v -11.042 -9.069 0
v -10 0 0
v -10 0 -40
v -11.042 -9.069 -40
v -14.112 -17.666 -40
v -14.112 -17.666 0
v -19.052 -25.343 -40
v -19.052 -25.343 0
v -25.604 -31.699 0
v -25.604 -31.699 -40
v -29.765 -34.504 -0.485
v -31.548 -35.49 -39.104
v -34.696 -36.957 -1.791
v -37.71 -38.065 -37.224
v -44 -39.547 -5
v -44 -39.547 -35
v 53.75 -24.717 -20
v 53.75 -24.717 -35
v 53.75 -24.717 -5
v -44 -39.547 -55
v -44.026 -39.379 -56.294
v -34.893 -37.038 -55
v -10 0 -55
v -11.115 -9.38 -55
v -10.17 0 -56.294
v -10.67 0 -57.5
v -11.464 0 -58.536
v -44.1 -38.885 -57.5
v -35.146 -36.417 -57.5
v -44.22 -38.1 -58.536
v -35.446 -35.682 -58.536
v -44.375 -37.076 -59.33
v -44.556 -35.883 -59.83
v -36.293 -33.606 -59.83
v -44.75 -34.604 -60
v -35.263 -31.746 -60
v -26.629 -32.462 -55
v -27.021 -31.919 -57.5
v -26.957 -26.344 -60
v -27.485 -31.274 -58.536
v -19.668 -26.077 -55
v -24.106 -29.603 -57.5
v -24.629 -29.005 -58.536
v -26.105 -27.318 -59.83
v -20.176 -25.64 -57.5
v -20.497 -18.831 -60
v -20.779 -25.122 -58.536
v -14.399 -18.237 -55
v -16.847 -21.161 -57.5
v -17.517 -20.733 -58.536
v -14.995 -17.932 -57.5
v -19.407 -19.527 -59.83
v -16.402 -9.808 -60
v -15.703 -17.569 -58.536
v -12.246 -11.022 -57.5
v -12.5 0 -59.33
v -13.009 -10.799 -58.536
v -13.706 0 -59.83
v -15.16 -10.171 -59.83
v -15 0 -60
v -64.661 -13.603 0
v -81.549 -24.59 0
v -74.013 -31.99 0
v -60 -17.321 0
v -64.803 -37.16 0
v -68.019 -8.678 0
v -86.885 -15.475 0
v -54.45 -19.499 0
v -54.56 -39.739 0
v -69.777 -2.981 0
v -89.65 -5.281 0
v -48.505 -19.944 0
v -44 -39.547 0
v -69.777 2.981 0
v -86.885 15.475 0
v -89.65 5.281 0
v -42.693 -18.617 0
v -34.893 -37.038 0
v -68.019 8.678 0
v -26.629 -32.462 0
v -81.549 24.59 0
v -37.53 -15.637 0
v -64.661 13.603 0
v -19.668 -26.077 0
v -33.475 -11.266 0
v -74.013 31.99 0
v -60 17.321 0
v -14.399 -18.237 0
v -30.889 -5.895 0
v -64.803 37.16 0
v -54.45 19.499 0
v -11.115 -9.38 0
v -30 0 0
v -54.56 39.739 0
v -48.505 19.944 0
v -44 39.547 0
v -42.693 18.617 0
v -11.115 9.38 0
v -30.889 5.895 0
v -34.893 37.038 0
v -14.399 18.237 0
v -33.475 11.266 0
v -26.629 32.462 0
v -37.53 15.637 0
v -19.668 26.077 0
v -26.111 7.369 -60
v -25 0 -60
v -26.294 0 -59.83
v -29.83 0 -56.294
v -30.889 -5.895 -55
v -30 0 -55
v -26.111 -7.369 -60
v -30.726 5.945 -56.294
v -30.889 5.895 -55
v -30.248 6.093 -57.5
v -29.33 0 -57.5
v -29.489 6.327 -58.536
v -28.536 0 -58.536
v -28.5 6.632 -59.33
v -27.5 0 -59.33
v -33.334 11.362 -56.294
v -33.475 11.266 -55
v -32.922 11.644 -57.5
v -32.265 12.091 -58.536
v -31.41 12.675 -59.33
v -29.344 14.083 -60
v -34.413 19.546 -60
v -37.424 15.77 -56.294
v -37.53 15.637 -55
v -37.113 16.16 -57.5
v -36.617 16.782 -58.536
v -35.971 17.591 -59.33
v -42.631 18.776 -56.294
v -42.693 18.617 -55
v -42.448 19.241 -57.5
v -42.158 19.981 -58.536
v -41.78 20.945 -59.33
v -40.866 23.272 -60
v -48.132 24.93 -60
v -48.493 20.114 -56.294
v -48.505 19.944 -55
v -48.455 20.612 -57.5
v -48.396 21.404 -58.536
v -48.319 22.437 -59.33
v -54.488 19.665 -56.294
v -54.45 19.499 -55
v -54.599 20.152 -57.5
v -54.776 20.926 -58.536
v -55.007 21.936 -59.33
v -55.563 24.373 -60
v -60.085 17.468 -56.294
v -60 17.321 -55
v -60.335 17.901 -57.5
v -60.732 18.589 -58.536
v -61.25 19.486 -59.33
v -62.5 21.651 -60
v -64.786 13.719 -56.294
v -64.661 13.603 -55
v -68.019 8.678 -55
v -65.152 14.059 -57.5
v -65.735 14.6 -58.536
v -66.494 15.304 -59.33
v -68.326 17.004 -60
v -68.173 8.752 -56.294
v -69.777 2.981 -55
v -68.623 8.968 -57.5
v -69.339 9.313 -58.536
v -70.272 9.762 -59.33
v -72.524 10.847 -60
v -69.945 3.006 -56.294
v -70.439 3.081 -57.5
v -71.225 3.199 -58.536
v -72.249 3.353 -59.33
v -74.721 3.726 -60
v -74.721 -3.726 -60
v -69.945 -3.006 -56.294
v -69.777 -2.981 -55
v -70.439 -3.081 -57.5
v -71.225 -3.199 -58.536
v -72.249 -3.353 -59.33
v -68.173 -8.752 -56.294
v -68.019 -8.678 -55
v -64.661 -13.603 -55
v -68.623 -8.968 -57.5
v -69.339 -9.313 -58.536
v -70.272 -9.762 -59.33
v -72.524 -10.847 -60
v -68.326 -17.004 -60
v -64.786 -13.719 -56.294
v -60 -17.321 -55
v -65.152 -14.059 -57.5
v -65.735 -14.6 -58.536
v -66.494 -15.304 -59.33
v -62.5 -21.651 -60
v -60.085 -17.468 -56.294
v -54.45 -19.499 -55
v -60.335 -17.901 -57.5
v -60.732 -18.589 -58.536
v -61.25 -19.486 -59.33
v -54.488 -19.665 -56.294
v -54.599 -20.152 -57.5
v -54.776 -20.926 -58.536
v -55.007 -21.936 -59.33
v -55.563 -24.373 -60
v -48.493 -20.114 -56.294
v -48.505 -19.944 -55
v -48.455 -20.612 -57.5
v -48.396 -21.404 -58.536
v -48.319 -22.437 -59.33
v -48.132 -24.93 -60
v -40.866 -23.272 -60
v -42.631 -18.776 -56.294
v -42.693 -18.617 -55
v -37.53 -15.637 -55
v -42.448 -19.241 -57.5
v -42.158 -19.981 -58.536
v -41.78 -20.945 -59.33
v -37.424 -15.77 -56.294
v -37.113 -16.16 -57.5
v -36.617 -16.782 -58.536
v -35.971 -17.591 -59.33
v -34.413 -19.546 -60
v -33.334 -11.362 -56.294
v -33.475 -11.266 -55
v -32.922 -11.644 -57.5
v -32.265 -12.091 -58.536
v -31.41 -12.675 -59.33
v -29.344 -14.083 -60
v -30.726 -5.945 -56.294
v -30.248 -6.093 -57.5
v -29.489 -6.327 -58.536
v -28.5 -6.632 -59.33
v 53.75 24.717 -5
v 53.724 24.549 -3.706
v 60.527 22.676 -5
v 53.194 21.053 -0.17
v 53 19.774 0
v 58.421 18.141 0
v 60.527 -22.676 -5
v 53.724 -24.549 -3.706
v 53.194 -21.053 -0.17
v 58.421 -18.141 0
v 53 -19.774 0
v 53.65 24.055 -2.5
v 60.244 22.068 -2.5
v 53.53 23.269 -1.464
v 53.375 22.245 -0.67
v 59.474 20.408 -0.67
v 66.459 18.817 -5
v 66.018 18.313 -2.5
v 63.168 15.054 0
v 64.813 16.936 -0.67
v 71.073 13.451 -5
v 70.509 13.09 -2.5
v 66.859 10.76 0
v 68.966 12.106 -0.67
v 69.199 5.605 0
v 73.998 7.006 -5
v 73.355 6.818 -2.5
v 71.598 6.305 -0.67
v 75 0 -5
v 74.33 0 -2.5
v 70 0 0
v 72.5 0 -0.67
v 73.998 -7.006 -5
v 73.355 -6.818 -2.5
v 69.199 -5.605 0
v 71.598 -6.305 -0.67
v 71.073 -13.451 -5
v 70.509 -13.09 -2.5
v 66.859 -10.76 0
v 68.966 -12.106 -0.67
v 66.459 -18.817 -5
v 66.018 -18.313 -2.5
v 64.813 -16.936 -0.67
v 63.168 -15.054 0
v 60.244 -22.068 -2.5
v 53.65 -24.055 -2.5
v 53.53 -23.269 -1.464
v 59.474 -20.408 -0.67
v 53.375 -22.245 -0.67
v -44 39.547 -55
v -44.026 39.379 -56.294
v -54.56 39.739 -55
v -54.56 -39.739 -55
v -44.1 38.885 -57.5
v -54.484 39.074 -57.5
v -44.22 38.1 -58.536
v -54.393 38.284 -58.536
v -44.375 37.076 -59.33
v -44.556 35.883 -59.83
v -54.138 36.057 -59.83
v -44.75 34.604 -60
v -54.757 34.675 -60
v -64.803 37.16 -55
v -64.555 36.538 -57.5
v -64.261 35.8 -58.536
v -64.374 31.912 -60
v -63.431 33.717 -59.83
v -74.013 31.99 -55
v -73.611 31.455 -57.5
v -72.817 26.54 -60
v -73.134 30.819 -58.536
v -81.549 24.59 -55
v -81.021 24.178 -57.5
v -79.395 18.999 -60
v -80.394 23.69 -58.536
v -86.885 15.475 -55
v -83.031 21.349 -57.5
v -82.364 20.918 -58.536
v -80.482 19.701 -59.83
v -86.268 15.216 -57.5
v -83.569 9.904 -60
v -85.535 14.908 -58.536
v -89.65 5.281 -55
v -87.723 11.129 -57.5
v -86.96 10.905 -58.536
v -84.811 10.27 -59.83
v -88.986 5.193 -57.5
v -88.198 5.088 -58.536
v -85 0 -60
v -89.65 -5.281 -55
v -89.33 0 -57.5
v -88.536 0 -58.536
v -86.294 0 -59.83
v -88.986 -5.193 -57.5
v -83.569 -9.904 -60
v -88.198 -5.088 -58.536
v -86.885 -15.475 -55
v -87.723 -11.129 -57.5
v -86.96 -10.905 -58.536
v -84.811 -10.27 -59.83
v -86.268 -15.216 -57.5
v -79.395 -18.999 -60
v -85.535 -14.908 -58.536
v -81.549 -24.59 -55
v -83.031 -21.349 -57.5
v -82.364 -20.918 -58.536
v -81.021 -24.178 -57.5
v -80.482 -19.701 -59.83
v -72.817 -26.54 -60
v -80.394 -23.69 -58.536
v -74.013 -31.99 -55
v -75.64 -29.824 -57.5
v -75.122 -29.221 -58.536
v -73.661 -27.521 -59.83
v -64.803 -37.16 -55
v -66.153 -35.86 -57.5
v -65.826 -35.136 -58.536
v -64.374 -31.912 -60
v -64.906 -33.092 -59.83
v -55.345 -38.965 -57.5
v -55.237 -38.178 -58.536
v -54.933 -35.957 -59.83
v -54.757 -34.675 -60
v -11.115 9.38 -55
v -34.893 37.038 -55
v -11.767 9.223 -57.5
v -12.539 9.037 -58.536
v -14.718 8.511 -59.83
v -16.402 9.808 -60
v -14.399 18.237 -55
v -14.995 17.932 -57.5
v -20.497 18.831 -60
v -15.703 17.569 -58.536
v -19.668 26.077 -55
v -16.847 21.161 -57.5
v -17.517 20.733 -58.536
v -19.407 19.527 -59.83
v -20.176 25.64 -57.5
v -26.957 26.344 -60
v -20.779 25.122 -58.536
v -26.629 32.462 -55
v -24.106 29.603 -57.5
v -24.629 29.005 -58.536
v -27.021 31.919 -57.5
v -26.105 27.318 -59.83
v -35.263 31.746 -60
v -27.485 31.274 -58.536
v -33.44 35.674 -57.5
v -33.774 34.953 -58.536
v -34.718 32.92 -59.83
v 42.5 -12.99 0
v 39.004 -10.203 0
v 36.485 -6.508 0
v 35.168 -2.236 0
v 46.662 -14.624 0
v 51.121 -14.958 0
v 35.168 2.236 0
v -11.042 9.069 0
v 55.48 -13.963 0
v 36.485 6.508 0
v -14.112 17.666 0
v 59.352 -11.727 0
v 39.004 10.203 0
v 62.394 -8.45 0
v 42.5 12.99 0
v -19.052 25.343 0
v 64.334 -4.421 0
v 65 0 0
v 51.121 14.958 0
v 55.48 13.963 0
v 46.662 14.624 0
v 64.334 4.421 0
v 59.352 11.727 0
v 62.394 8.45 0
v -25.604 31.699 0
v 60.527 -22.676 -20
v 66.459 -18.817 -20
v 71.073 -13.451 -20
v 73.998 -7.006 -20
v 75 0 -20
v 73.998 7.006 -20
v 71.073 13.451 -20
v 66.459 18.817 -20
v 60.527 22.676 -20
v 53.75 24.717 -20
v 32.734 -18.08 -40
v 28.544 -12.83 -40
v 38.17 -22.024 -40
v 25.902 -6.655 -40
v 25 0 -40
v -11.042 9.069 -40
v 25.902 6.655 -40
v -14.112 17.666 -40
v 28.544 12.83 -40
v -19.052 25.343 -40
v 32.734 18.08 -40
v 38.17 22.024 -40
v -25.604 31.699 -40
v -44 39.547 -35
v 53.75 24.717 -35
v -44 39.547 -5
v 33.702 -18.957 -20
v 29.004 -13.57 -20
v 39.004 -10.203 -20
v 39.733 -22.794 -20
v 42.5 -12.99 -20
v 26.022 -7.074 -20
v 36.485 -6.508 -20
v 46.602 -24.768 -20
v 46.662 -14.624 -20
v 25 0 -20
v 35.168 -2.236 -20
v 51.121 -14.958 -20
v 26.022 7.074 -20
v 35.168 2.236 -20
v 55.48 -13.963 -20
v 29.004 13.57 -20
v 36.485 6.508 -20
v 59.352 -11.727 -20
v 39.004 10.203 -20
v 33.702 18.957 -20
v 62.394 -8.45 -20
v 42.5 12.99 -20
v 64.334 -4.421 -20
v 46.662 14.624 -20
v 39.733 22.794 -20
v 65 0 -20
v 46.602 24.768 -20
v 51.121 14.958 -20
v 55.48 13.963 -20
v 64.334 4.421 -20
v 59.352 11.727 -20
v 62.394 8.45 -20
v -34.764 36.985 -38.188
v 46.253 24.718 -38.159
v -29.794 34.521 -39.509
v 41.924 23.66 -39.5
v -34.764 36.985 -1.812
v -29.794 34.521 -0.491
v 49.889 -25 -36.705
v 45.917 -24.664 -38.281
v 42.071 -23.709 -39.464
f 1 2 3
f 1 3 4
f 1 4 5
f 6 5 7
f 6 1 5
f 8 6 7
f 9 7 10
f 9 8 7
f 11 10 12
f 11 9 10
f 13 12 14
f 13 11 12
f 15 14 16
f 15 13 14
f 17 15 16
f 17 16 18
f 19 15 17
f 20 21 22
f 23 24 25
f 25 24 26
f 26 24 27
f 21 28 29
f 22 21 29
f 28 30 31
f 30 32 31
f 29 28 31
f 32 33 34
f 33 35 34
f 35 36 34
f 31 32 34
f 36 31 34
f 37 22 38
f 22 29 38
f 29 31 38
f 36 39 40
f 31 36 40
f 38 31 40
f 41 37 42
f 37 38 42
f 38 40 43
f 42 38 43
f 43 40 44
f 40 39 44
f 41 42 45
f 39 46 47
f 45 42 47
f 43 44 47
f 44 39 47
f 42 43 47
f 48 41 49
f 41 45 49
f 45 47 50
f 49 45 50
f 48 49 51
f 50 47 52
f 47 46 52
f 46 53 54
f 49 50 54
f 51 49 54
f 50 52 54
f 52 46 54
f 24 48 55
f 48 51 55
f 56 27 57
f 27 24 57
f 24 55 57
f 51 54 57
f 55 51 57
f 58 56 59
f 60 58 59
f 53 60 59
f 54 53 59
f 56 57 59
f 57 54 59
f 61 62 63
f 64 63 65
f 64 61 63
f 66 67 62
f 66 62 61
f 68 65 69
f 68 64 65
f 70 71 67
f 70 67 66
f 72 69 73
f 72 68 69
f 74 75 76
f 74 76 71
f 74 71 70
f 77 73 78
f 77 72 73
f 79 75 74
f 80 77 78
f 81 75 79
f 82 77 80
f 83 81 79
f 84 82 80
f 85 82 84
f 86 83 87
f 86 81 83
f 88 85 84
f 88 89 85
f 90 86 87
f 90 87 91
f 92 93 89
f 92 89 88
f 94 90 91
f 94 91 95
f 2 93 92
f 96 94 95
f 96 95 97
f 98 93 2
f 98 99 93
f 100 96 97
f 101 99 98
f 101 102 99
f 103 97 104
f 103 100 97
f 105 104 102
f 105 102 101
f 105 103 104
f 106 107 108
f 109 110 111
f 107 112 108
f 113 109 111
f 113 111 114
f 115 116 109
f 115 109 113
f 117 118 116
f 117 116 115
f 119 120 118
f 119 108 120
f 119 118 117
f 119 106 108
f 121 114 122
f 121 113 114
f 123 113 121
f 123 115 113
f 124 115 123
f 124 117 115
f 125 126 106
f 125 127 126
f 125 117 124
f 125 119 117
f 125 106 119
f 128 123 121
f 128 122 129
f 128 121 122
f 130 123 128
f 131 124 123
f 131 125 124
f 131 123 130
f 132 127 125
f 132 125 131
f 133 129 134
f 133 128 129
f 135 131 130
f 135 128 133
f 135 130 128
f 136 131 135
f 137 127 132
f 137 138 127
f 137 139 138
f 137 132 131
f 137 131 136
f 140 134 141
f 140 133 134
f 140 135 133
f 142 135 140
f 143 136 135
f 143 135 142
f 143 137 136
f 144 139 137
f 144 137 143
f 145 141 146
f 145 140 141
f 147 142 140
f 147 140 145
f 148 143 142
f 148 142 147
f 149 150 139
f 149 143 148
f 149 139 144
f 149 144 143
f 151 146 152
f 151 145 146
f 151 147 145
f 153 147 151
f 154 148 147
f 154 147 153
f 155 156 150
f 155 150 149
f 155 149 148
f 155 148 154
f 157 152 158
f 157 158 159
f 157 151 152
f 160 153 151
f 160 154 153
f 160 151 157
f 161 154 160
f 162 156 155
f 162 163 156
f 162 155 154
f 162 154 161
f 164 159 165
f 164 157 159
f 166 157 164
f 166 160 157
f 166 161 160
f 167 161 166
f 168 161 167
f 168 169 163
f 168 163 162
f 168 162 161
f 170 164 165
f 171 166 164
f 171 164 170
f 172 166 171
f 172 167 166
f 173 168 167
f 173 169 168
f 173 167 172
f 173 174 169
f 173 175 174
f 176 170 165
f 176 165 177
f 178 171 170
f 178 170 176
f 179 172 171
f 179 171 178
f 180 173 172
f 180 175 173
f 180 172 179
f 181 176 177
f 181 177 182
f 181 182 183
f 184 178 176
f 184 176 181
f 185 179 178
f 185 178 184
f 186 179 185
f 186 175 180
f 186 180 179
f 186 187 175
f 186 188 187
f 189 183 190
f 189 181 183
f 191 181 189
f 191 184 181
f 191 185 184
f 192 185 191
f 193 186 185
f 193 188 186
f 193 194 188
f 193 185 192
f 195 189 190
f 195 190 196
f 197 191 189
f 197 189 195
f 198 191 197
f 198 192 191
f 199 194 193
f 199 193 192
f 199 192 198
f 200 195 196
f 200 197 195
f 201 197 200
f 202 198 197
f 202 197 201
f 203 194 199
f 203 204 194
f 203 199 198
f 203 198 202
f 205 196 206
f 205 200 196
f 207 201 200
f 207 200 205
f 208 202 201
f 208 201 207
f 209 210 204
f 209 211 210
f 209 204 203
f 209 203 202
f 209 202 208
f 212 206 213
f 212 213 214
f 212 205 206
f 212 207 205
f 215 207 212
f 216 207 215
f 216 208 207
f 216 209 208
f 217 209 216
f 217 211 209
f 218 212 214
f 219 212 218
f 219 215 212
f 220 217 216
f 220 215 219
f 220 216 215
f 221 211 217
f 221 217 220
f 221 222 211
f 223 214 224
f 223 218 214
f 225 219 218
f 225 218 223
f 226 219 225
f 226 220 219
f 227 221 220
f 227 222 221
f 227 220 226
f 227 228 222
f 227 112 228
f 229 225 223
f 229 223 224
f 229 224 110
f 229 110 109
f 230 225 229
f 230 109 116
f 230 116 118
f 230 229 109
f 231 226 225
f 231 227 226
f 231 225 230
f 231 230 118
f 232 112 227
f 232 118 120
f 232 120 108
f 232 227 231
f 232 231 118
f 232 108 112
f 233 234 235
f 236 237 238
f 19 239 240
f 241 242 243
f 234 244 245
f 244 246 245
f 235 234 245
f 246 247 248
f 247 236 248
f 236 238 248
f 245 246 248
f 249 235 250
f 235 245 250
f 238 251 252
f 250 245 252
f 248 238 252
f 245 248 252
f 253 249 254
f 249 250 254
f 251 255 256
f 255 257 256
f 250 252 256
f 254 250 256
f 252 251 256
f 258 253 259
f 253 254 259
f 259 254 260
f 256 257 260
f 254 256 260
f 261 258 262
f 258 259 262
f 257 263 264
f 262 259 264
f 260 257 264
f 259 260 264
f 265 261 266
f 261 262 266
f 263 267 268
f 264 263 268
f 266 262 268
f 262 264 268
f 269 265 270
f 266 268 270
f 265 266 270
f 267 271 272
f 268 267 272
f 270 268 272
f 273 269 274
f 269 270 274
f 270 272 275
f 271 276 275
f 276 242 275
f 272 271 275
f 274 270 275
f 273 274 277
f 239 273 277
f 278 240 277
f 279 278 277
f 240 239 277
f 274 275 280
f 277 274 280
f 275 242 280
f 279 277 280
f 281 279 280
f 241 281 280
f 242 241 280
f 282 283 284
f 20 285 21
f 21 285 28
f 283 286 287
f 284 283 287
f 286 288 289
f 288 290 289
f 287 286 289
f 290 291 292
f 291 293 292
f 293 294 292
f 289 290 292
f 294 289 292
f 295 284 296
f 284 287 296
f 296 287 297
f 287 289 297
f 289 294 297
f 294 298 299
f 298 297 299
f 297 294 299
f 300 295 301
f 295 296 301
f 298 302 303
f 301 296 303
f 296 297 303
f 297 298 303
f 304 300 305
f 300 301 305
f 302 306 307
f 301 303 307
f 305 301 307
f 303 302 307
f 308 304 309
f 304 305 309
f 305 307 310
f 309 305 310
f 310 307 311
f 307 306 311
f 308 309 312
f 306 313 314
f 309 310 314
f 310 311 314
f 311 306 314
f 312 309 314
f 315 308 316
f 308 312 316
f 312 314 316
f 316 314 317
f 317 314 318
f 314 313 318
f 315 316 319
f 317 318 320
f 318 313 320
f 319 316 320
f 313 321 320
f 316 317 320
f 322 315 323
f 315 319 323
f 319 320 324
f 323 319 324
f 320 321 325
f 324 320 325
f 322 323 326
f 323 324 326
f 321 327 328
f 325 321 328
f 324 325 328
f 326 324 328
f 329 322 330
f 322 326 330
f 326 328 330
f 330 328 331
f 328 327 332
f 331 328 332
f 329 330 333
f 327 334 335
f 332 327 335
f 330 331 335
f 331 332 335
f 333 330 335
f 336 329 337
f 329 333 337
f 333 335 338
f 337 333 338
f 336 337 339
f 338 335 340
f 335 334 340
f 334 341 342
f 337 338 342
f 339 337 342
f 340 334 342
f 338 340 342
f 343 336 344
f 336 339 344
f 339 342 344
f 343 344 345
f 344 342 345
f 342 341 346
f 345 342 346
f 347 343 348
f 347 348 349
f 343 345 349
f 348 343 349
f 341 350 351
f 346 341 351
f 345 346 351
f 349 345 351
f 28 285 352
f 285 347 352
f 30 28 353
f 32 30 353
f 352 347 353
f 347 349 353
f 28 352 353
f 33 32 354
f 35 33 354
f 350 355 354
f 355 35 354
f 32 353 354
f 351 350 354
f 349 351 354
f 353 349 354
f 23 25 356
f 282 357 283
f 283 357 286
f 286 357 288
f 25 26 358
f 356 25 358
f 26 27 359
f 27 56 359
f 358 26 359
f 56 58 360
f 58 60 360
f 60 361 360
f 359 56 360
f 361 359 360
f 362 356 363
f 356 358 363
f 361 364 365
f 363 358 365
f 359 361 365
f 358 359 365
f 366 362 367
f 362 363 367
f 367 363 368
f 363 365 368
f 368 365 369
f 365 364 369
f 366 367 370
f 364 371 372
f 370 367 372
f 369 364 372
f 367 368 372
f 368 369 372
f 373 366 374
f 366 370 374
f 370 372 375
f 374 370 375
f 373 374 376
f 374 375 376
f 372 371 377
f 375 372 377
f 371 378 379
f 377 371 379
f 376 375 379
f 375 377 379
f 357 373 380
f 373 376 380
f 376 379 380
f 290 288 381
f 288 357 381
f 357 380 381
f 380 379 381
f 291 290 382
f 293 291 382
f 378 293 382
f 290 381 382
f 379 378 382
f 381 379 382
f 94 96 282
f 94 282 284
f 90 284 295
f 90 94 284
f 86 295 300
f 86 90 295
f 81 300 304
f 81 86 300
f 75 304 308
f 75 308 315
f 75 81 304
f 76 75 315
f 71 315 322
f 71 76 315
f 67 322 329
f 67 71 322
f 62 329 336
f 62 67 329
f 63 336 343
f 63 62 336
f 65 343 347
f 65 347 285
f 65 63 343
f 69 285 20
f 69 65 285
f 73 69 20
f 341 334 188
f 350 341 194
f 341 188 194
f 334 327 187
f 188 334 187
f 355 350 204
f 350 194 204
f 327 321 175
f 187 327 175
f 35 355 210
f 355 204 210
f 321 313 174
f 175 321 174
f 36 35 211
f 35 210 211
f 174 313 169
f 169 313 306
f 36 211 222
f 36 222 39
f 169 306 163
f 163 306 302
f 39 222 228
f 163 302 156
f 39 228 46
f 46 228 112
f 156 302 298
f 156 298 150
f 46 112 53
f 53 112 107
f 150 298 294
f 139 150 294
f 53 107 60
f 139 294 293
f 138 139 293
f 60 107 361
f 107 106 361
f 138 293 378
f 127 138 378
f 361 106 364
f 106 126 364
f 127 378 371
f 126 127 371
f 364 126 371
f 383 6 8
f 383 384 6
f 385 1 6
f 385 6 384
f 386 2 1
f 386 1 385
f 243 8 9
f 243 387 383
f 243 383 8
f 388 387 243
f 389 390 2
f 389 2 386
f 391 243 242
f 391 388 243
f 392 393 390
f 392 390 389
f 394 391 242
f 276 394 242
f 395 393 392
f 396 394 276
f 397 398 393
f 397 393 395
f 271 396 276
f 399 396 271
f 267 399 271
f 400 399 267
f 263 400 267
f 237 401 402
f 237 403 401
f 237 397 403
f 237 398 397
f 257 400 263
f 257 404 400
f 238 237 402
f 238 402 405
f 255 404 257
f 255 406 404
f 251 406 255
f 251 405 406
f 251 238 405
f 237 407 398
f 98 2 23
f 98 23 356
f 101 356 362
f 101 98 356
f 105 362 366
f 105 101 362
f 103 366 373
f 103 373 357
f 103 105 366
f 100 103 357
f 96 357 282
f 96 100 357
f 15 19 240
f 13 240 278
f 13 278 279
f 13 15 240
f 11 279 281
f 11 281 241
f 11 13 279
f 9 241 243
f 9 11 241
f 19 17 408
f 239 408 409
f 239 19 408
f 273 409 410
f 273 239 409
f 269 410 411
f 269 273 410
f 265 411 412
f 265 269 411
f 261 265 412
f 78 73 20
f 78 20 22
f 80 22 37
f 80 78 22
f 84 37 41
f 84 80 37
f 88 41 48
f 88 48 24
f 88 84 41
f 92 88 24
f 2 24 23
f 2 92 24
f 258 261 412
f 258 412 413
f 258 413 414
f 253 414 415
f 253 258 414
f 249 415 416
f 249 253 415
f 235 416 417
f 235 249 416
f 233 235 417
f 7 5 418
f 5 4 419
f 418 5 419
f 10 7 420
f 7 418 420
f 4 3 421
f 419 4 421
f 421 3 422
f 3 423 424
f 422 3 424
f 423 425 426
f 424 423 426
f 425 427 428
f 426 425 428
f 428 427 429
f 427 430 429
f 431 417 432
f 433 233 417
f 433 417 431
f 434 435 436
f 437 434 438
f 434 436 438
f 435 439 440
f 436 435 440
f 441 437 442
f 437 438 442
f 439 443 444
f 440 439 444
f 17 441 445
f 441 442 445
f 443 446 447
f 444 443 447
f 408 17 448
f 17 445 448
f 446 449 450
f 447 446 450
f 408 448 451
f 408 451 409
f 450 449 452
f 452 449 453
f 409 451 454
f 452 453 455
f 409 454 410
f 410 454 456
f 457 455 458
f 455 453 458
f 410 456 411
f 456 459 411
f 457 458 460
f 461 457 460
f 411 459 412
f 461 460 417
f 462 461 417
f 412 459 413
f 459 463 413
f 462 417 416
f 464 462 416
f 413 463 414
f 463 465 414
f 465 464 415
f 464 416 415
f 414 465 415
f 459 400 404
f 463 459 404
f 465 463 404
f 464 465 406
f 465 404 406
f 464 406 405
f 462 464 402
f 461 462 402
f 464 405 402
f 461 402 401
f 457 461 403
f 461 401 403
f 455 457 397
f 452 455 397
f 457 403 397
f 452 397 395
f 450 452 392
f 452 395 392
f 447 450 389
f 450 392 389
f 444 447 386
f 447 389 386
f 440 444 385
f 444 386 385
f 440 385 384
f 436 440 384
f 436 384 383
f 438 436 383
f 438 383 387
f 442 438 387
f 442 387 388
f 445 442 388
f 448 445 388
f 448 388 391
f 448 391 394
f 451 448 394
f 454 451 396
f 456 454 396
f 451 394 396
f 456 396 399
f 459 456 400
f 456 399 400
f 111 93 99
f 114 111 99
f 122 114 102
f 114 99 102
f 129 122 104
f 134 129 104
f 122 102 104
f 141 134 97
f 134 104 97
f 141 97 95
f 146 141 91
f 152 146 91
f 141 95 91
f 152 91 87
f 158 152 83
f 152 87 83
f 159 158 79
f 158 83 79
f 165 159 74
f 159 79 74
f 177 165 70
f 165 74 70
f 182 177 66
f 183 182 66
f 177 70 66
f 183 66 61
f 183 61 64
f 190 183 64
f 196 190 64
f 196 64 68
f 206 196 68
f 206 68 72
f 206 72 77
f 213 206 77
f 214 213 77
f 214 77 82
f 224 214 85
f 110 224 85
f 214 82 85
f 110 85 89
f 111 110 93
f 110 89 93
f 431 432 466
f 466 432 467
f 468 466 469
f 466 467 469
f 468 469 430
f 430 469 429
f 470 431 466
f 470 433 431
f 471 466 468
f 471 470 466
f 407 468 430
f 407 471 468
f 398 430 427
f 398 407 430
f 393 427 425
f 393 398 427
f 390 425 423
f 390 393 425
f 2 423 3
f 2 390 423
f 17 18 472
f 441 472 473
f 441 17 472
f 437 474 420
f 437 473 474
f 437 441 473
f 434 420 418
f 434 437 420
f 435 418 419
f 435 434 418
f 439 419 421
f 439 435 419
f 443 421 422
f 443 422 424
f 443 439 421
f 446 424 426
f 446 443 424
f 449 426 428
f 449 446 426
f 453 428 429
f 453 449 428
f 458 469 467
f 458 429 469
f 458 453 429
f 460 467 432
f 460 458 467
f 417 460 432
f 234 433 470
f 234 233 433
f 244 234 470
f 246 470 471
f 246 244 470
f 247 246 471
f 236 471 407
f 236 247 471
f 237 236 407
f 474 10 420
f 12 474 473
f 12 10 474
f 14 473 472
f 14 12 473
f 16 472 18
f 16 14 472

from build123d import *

# Parameters (mm, degrees)
F0_R         = 20
F1_DEPTH     = 60
F2_DEPTH     = 40
F0_R_2       = 15
F3_DEPTH     = 20
F4_R         = 5
F5_T1_DEPTH  = 141.3685996664
F5_T3_DEPTH  = 141.3685996664
F5_T5_DEPTH  = 120.1185996664
F5_T7_DEPTH  = 120.1185996664
F5_T10_ANGLE = 162.7461468826


# Not quite as in the source:
# - a fillet or chamfer that OpenCascade refuses, or shapes differently, is made with other operations: its cross-section is extruded or revolved along the edge and cut away or added
# - two fillets or chamfers of one size are made in one step


with BuildPart() as f1:
    # F0 (on Top) → F1 (new body)
    with BuildSketch(Plane.XY):
        with BuildLine():
            ThreePointArc((-44, -39.5474398666), (-19.6684982238, -26.0768096208), (-10, 0))
            ThreePointArc((-10, 0), (-19.6684982238, 26.0768096208), (-44, 39.5474398666))
            ThreePointArc((-44, 39.5474398666), (-90, 0), (-44, -39.5474398666))
        make_face()
        with Locations((-50, 0)):
            Circle(F0_R, mode=Mode.SUBTRACT)
    extrude(amount=-F1_DEPTH)

    # F4
    f4_edges = [f1.edges().sort_by_distance(p)[0] for p in [
        (-56, 39.54744, -60),
        (-70, 0, -60),
    ]]
    fillet(f4_edges, radius=F4_R)


with BuildPart() as f2:
    # F0 (on Top) → F2 (new body)
    with BuildSketch(Plane.XY):
        with BuildLine():
            ThreePointArc((-44, 39.5474398666), (-19.6684982238, 26.0768096208), (-10, 0))
            ThreePointArc((-10, 0), (-19.6684982238, -26.0768096208), (-44, -39.5474398666))
            Line((-44, -39.5474398666), (53.75, -24.7171499166))
            ThreePointArc((53.75, -24.7171499166), (25, 0), (53.75, 24.7171499166))
            Line((53.75, 24.7171499166), (-44, 39.5474398666))
        make_face()
    extrude(amount=-F2_DEPTH)

    # F0 (on Top) → F3 (join)
    with BuildSketch(Plane.XY):
        with BuildLine():
            ThreePointArc((75, 0), (68.9571886101, 16.298006013), (53.75, 24.7171499166))
            ThreePointArc((53.75, 24.7171499166), (25, 0), (53.75, -24.7171499166))
            ThreePointArc((53.75, -24.7171499166), (68.9571886101, -16.298006013), (75, 0))
        make_face()
        with Locations((50, 0)):
            Circle(F0_R_2, mode=Mode.SUBTRACT)
    extrude(amount=-F3_DEPTH)

    # F5: fillet of radius 5 on 9 edges, made by hand

    # F5_s2 → F5_t1 (cut)
    with BuildSketch(Plane(origin=(69.8845774291, -10.602644975, 0), x_dir=(0, 0, 1), z_dir=(-0.9886859967, 0.15, 0))):
        with BuildLine():
            ThreePointArc((-35, 32.5), (-38.5355339059, 31.0355339059), (-40, 27.5))
            Line((-40, 27.5), (-40, 32.5))
            Line((-40, 32.5), (-35, 32.5))
        make_face()
    extrude(amount=F5_T1_DEPTH, mode=Mode.SUBTRACT)

    # F5_s4 → F5_t3 (cut)
    with BuildSketch(Plane(origin=(-69.8845774291, -10.602644975, 0), x_dir=(0, 0, 1), z_dir=(0.9886859967, 0.15, 0))):
        with BuildLine():
            ThreePointArc((-40, 27.5), (-38.5355339059, 31.0355339059), (-35, 32.5))
            Line((-35, 32.5), (-40, 32.5))
            Line((-40, 32.5), (-40, 27.5))
        make_face()
    extrude(amount=F5_T3_DEPTH, mode=Mode.SUBTRACT)

    # F5_s6 → F5_t5 (cut)
    with BuildSketch(Plane(origin=(48.875, -7.415144975, 0), x_dir=(0, 0, 1), z_dir=(-0.9886859967, 0.15, 0))):
        with BuildLine():
            ThreePointArc((-5, 32.5), (-1.4644660941, 31.0355339059), (0, 27.5))
            Line((0, 27.5), (0, 32.5))
            Line((0, 32.5), (-5, 32.5))
        make_face()
    extrude(amount=F5_T5_DEPTH, mode=Mode.SUBTRACT)

    # F5_s8 → F5_t7 (cut)
    with BuildSketch(Plane(origin=(-69.8845774291, -10.602644975, 0), x_dir=(0, 0, 1), z_dir=(0.9886859967, 0.15, 0))):
        with BuildLine():
            ThreePointArc((-5, 32.5), (-1.4644660941, 31.0355339059), (0, 27.5))
            Line((0, 27.5), (0, 32.5))
            Line((0, 32.5), (-5, 32.5))
        make_face()
    extrude(amount=F5_T7_DEPTH, mode=Mode.SUBTRACT)

    # F5_s9 → F5_t10 (revolve, cut)
    with BuildSketch(Plane(origin=(48.875, -7.415144975, 0), x_dir=(0, 0, 1), z_dir=(-0.9886859967, 0.15, 0))):
        with BuildLine():
            ThreePointArc((-5, 32.5), (-1.4644660941, 31.0355339059), (0, 27.5))
            Line((0, 27.5), (0, 32.5))
            Line((0, 32.5), (-5, 32.5))
        make_face()
    revolve(axis=Axis((50, 0, 0), (0, 0, -1)), revolution_arc=F5_T10_ANGLE, mode=Mode.SUBTRACT)


solid = Compound([f1.part, f2.part])
